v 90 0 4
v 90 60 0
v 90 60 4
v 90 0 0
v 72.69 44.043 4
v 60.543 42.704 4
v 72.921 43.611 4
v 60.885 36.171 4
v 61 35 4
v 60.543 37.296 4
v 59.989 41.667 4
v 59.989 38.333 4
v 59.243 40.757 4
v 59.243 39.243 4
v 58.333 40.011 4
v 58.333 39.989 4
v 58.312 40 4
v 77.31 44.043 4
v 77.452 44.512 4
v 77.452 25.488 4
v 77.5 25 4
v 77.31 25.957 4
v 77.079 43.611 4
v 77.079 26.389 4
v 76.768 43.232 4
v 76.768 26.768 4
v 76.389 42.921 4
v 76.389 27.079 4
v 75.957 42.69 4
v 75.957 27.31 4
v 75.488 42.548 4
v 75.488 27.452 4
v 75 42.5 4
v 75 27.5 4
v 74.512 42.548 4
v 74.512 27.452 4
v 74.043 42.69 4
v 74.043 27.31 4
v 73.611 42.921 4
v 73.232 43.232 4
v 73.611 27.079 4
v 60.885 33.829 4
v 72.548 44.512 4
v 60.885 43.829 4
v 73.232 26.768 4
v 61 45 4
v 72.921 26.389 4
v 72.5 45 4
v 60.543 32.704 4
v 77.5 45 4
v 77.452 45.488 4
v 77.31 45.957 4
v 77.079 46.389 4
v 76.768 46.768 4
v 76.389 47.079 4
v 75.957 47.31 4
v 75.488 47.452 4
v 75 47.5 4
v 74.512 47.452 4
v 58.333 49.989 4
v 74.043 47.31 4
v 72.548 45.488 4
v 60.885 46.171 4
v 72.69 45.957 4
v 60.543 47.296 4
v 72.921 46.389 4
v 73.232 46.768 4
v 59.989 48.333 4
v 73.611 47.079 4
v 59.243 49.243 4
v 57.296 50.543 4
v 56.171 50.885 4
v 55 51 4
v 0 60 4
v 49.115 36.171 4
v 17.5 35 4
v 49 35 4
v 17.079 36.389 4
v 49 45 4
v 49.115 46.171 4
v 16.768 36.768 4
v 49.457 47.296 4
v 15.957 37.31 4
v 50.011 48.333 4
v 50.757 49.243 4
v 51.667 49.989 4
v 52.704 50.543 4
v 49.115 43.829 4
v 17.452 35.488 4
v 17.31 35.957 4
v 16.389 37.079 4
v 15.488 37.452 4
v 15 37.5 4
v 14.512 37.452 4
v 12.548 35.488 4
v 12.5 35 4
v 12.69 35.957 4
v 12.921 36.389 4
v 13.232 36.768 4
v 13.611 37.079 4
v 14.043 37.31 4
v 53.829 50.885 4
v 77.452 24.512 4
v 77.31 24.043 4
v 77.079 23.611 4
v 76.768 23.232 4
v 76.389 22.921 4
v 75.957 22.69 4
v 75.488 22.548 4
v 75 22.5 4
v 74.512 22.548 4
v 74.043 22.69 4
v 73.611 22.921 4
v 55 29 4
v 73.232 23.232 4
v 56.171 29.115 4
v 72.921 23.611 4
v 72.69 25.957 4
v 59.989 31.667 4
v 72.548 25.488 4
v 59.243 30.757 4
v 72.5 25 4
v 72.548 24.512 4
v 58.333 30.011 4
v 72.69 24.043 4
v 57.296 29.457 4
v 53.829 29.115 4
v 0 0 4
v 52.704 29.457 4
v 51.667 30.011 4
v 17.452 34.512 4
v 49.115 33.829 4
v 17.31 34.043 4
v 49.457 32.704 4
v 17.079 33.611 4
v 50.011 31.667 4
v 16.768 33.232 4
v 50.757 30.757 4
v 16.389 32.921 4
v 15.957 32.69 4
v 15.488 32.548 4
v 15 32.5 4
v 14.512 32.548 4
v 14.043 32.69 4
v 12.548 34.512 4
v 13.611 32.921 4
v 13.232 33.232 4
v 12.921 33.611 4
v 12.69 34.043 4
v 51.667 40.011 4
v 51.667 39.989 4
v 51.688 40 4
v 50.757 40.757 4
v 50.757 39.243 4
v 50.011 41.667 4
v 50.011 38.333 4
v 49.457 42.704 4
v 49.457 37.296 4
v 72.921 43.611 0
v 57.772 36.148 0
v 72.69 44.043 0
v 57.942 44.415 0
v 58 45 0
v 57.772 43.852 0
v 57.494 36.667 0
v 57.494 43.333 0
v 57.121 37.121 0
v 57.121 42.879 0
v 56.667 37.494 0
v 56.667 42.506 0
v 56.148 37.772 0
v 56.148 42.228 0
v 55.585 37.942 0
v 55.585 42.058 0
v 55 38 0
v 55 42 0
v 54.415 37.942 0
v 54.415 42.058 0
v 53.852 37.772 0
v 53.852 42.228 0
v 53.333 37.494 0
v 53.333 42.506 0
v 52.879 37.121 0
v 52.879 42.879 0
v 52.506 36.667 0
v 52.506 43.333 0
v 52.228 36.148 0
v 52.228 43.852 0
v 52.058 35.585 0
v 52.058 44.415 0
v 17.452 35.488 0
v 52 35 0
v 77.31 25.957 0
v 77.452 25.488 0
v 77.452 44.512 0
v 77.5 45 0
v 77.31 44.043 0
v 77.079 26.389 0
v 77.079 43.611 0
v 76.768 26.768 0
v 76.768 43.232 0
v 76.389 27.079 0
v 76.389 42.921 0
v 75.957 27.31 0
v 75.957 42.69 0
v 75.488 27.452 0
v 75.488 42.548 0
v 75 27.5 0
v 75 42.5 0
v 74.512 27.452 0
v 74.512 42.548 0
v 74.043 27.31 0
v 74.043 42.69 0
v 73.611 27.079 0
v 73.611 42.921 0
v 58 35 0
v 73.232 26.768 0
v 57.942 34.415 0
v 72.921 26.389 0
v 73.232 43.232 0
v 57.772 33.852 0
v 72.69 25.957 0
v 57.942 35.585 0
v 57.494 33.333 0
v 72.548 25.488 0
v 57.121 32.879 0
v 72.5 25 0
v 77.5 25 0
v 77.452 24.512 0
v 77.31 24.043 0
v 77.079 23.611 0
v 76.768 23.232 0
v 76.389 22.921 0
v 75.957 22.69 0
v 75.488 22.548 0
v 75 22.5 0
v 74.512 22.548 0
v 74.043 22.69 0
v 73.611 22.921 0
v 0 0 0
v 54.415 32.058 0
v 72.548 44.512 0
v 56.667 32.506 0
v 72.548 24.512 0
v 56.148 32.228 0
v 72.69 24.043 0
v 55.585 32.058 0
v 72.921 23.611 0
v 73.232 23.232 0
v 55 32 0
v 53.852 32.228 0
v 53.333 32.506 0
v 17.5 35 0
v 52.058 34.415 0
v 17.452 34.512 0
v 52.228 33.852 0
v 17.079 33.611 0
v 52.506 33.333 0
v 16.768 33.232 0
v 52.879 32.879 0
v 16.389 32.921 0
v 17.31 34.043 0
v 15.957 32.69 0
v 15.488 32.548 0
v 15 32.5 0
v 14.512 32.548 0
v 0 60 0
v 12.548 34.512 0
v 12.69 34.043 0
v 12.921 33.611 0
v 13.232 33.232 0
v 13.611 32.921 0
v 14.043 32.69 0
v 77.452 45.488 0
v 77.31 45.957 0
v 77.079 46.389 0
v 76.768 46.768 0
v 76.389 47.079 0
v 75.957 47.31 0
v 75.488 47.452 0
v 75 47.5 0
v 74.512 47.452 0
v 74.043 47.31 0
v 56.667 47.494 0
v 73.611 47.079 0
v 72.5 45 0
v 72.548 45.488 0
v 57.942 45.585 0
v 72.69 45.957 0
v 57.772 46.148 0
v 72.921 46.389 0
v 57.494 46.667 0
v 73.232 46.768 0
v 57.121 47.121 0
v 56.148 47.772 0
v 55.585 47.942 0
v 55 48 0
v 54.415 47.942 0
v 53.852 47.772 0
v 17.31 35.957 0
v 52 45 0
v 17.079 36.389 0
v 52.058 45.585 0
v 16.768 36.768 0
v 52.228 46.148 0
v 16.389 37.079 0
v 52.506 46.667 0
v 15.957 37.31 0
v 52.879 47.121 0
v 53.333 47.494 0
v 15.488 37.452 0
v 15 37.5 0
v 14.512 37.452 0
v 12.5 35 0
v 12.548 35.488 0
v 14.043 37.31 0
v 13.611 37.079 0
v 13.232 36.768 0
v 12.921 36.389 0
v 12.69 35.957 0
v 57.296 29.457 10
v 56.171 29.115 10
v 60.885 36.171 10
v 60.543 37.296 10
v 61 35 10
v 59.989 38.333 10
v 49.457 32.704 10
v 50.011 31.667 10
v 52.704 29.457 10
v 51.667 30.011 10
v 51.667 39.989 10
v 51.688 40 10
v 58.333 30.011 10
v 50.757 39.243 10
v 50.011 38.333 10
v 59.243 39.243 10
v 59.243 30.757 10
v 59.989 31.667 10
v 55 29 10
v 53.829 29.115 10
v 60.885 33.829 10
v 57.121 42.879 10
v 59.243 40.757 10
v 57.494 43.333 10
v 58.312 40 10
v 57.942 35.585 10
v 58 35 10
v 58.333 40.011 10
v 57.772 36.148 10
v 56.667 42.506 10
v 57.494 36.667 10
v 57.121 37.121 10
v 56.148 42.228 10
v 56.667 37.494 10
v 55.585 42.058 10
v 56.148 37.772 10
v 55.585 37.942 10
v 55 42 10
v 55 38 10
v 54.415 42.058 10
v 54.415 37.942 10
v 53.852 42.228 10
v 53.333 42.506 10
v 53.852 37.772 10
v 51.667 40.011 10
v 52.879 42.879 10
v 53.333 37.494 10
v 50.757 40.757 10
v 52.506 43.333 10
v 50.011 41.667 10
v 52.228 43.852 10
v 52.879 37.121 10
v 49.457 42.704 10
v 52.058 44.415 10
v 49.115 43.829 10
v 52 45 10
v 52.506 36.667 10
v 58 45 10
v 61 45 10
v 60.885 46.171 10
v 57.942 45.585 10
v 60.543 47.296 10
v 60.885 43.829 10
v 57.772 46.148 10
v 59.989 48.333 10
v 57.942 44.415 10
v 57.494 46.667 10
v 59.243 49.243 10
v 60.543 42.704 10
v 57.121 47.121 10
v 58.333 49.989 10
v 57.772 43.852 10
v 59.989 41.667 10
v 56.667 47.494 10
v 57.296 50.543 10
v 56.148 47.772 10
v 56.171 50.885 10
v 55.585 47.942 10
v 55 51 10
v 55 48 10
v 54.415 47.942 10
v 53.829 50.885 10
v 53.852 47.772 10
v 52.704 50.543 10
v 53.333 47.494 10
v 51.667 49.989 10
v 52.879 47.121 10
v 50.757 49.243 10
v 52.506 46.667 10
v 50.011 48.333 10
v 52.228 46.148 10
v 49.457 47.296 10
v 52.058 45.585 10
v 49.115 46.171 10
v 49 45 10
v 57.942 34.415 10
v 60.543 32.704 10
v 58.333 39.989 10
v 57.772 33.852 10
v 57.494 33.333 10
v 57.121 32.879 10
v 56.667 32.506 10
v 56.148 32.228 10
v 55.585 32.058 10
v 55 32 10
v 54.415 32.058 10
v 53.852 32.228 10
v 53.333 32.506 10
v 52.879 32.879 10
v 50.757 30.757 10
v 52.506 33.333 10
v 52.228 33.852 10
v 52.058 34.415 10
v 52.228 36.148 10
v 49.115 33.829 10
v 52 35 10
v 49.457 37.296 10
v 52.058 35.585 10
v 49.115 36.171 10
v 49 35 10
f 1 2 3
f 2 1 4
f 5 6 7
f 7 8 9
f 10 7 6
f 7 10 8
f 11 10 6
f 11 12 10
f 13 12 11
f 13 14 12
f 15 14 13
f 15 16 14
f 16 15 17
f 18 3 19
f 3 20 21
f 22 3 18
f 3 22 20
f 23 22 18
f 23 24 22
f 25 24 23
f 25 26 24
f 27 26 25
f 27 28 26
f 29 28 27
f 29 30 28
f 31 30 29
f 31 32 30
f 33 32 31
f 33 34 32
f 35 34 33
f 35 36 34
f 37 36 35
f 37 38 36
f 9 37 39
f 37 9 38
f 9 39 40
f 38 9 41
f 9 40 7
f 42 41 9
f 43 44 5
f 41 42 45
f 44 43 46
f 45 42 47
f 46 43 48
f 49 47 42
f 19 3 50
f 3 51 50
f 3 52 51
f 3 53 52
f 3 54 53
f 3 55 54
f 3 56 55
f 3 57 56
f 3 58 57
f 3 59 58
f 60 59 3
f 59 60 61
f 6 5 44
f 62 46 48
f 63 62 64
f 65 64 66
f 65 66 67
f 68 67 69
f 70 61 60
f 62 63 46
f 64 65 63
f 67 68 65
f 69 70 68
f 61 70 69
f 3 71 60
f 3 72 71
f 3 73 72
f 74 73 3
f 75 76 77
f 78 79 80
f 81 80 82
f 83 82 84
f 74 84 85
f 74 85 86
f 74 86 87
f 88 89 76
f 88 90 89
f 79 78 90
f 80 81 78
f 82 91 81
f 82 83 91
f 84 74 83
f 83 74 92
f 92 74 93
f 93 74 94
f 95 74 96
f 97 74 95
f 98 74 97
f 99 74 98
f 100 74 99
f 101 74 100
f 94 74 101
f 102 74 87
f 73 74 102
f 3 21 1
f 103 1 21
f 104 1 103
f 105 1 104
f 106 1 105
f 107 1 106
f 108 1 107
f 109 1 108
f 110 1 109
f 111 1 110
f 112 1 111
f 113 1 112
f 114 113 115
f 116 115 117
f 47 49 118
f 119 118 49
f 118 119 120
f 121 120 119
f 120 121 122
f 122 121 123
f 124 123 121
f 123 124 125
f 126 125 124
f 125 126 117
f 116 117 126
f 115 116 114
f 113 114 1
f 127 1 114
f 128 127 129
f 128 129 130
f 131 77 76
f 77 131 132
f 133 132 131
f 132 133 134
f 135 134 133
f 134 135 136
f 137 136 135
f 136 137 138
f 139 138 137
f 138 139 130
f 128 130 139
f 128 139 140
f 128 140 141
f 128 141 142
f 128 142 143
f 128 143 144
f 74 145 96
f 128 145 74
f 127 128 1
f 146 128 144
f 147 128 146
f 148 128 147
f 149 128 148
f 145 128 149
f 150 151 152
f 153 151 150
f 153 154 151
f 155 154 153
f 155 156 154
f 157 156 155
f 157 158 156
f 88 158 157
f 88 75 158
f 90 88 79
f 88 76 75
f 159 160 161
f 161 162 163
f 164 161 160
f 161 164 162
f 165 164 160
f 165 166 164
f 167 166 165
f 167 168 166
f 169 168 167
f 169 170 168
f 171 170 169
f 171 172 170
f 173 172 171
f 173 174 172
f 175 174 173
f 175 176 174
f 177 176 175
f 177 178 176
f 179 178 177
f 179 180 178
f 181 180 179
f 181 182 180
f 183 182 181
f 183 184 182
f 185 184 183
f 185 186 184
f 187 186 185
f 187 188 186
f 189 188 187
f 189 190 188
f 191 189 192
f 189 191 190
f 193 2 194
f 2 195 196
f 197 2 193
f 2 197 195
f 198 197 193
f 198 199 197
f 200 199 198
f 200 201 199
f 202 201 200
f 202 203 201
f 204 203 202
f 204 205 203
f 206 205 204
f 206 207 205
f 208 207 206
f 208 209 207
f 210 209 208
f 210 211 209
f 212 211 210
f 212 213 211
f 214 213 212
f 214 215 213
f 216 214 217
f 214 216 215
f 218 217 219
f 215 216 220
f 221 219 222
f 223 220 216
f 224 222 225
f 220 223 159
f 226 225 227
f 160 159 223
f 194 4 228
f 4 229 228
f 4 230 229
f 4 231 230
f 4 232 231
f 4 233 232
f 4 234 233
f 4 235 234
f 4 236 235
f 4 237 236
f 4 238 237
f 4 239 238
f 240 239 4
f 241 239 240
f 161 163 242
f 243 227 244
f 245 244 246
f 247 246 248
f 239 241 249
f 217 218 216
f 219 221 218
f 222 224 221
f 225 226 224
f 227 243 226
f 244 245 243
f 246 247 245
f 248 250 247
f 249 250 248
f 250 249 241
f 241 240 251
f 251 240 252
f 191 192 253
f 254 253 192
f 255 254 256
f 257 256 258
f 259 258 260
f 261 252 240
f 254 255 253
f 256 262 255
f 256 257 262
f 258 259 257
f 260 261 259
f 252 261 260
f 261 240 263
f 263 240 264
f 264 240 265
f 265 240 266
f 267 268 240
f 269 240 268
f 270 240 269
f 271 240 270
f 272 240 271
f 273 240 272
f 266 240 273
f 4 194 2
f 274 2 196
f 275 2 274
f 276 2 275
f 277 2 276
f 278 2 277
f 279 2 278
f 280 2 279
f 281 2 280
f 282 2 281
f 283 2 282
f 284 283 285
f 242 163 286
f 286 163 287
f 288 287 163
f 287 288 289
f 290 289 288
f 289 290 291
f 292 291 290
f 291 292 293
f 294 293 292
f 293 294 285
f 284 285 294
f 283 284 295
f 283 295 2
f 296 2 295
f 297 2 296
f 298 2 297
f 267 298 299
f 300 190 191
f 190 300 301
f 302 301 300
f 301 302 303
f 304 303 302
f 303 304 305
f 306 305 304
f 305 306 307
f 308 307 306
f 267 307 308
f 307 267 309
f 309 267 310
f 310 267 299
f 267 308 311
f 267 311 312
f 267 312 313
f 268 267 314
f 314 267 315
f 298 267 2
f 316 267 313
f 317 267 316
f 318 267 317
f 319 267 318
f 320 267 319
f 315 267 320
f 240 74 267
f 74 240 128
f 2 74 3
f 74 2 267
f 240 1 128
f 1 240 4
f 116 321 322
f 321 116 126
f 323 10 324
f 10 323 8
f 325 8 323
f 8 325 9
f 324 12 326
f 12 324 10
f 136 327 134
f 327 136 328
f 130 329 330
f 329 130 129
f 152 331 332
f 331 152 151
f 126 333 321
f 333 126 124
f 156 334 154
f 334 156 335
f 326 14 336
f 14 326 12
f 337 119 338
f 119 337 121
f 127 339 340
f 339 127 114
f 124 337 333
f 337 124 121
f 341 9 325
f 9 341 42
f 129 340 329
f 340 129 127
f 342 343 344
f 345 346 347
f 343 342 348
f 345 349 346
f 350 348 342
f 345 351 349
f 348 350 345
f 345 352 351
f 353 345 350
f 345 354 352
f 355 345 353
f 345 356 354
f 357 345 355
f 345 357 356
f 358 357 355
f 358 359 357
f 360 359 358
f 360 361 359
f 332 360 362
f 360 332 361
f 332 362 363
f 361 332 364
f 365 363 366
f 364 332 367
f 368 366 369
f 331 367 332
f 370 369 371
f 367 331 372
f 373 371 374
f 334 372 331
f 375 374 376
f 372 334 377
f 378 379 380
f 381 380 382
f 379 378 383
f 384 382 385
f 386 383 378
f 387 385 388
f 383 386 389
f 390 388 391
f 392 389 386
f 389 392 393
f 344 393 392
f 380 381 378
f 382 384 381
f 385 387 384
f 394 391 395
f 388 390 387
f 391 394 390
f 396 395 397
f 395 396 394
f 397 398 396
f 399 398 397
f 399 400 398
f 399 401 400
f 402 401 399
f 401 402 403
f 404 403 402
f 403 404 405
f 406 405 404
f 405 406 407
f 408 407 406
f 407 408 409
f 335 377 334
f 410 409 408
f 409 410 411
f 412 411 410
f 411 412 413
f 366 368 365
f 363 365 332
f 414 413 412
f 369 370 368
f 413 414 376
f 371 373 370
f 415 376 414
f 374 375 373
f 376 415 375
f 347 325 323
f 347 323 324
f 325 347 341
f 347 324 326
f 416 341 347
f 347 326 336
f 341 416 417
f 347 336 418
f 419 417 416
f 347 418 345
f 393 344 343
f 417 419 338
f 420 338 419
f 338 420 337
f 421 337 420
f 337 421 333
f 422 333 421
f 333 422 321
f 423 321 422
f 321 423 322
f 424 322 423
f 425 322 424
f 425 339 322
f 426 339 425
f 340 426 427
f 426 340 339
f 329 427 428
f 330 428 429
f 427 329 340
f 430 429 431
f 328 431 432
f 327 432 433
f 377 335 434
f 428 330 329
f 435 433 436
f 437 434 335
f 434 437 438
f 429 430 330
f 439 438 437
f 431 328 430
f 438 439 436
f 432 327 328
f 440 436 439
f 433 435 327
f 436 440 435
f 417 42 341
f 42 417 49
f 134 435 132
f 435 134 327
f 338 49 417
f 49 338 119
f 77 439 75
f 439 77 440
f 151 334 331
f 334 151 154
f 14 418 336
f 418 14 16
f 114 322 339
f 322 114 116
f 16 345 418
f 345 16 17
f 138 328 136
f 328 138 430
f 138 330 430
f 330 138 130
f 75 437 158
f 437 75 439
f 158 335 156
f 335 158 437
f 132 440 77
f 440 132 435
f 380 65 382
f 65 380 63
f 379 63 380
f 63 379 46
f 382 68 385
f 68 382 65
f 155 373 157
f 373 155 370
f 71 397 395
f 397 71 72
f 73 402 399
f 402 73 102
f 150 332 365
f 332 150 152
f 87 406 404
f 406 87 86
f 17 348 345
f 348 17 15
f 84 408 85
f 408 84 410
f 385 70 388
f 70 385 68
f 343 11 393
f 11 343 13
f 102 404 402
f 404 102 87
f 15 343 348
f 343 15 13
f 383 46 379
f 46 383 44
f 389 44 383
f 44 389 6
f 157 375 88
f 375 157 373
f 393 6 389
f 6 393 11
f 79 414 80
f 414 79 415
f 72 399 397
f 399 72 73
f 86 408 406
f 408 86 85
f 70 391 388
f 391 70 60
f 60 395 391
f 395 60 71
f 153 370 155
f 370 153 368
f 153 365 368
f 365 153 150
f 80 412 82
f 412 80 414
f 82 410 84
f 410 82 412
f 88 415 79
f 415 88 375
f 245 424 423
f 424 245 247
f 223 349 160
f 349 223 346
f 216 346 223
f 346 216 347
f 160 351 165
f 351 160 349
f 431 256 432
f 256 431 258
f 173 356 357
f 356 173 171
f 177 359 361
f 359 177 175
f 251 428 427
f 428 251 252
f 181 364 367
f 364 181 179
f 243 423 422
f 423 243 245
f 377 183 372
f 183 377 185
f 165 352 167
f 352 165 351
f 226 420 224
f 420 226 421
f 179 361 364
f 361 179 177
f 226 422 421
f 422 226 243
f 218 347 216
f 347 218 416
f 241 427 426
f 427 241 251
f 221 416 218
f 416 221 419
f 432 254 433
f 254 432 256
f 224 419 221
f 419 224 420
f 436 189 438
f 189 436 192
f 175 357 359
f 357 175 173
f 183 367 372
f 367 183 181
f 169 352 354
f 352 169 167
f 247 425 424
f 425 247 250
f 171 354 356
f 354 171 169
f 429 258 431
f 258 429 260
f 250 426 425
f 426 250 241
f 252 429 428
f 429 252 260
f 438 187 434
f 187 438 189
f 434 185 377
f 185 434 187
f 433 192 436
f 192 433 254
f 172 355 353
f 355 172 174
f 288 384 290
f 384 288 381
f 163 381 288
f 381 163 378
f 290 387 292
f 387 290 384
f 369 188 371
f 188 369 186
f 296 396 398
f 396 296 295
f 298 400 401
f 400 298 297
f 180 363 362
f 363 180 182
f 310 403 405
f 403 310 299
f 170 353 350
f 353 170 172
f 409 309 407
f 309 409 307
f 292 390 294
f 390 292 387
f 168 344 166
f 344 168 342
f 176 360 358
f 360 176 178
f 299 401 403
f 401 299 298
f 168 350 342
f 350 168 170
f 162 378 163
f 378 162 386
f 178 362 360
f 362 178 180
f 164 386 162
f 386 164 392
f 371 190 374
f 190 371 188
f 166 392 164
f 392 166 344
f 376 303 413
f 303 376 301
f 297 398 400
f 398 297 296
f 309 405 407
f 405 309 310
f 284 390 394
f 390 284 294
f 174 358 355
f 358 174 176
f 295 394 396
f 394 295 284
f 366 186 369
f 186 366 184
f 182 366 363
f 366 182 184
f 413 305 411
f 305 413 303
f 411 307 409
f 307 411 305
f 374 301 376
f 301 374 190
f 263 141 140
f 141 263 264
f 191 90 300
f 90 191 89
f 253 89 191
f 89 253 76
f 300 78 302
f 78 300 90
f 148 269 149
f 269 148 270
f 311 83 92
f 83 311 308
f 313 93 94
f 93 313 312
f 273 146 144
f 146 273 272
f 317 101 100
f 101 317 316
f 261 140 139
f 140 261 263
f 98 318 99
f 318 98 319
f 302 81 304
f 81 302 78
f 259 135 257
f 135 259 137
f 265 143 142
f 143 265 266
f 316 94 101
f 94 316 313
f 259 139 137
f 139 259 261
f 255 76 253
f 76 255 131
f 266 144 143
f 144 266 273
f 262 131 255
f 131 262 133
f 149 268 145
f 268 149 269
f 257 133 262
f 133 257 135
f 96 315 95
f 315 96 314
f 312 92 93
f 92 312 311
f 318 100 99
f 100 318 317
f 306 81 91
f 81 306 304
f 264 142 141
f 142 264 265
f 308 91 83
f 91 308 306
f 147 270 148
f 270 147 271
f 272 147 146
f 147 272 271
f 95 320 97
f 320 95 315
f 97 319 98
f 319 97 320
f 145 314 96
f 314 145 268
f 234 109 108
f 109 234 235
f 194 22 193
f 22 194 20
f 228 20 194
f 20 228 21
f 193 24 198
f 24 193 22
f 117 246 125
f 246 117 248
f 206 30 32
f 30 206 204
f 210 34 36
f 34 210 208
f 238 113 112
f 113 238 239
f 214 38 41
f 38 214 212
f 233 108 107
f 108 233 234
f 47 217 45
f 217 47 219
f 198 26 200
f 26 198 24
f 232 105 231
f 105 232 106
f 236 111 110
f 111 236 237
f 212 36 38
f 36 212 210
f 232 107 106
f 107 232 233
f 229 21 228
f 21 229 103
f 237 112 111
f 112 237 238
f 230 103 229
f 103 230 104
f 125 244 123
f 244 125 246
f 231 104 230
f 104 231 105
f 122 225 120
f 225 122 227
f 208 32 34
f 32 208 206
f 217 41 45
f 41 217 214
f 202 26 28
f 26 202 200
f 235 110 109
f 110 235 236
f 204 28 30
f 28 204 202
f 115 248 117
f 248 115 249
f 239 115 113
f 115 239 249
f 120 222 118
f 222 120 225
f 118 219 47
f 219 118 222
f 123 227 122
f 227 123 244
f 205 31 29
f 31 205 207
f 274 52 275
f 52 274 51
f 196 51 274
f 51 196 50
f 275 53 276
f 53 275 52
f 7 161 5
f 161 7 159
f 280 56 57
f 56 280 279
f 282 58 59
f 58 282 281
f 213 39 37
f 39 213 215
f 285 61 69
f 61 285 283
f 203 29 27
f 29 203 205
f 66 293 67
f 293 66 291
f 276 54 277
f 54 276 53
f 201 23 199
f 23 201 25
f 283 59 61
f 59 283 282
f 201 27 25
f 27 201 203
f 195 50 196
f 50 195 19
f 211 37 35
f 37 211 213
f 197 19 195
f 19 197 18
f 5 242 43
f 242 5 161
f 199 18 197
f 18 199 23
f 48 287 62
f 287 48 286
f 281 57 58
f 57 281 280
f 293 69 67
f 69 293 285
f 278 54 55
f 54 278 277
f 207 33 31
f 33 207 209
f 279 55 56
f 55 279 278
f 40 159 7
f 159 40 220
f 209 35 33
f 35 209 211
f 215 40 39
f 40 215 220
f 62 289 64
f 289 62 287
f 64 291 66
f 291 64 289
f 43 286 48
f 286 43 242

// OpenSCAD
$fn = 32;

// ----------------------------------------------------------------------
// Mixed field: bosses and holes at given coordinates
// ----------------------------------------------------------------------

// --- parameters (mm) ---
plate_l = 90;             // plate length, X
plate_w = 60;             // plate width, Y
plate_t = 4;              // plate thickness, Z
boss_d = 12;              // boss diameter
boss_h = 6;               // boss height above the plate
hole_d = 5;               // through hole diameter
fit_tol = 0.05;           // tolerance for press fits, mm
free_tol = 0.3;           // tolerance for clearance fits, mm

total_h = plate_t + boss_h;  // overall height

difference() {
  union() {
    cube([plate_l, plate_w, plate_t]);
    translate([55, 35, plate_t]) cylinder(h = boss_h, d = boss_d);
    translate([55, 45, plate_t]) cylinder(h = boss_h, d = boss_d);
  }
  translate([55, 35, -1]) cylinder(h = total_h + 2, d = boss_d / 2);
  translate([55, 45, -1]) cylinder(h = total_h + 2, d = boss_d / 2);
  translate([15, 35, -1]) cylinder(h = plate_t + 2, d = hole_d);
  translate([75, 25, -1]) cylinder(h = plate_t + 2, d = hole_d);
  translate([75, 45, -1]) cylinder(h = plate_t + 2, d = hole_d);
}
